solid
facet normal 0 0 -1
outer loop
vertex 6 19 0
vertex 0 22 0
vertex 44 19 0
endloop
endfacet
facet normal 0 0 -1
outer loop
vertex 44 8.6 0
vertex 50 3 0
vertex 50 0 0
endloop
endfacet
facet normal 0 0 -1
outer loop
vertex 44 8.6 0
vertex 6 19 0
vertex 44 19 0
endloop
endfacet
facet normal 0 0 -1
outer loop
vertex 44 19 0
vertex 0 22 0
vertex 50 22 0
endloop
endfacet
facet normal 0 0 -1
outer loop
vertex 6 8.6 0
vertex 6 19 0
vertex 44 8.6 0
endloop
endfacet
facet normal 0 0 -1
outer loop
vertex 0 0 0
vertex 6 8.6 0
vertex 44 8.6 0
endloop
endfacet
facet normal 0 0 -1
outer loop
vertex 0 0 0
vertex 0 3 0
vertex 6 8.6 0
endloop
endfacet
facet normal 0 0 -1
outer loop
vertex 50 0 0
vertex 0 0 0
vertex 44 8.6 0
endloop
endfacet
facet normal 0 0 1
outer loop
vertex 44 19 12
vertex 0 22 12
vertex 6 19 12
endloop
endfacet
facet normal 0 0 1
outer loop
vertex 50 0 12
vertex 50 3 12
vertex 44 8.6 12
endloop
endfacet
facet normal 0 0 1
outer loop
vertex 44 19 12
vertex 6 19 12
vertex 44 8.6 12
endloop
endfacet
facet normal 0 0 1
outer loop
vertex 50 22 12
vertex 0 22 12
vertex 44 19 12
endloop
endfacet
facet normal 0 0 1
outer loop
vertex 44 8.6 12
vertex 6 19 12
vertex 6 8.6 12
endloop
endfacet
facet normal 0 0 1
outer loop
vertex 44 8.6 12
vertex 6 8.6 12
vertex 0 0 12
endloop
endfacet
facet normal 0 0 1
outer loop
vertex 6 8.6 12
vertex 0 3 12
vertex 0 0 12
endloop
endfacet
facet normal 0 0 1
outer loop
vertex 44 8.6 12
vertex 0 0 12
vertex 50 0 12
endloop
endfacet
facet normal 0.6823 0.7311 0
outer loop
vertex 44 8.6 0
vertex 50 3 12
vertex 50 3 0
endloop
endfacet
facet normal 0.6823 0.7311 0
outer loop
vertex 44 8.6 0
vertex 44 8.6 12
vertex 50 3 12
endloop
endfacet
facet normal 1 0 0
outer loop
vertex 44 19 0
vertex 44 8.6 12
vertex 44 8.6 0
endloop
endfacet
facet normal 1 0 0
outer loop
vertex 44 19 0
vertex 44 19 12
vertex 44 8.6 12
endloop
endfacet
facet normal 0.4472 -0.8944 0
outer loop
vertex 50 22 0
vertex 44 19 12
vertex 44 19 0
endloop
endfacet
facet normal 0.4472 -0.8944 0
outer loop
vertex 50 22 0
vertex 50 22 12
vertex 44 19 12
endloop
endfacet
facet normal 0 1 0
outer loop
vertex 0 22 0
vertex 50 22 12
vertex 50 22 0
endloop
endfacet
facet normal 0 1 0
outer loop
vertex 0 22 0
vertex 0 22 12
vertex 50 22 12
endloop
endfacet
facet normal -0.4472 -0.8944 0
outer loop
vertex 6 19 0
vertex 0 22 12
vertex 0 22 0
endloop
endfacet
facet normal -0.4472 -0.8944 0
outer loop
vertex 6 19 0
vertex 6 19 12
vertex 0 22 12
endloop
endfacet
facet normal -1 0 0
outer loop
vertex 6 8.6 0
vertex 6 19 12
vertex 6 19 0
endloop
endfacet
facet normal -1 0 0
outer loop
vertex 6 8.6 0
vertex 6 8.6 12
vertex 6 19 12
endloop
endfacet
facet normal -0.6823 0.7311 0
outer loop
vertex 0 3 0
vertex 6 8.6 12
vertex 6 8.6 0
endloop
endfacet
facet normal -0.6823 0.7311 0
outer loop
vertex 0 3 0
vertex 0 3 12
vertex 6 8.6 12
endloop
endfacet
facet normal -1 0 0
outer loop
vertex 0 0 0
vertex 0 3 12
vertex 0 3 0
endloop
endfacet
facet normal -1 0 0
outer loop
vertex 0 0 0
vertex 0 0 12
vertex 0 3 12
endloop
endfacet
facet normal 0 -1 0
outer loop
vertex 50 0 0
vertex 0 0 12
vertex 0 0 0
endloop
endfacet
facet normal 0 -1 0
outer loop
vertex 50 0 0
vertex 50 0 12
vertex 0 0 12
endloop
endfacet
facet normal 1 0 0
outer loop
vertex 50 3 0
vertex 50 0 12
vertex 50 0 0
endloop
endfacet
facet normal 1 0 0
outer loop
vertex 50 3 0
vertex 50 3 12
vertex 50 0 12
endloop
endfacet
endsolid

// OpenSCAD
$fn = 32;

// ----------------------------------------------------------------------
// Key bar: dovetail key, 12 mm thick
// ----------------------------------------------------------------------

// --- parameters (mm) ---
profile_height = 12;      // extrusion height
profile_points = 10;      // points of the closed outline

profile = [[0, 0], [50, 0], [50, 3], [44, 8.6], [44, 19], [50, 22], [0, 22], [6, 19], [6, 8.6], [0, 3]];  // single closed polygon, 10 points, counter clockwise

// --- the one profile operation ---
linear_extrude(height = profile_height) polygon(points = profile);
